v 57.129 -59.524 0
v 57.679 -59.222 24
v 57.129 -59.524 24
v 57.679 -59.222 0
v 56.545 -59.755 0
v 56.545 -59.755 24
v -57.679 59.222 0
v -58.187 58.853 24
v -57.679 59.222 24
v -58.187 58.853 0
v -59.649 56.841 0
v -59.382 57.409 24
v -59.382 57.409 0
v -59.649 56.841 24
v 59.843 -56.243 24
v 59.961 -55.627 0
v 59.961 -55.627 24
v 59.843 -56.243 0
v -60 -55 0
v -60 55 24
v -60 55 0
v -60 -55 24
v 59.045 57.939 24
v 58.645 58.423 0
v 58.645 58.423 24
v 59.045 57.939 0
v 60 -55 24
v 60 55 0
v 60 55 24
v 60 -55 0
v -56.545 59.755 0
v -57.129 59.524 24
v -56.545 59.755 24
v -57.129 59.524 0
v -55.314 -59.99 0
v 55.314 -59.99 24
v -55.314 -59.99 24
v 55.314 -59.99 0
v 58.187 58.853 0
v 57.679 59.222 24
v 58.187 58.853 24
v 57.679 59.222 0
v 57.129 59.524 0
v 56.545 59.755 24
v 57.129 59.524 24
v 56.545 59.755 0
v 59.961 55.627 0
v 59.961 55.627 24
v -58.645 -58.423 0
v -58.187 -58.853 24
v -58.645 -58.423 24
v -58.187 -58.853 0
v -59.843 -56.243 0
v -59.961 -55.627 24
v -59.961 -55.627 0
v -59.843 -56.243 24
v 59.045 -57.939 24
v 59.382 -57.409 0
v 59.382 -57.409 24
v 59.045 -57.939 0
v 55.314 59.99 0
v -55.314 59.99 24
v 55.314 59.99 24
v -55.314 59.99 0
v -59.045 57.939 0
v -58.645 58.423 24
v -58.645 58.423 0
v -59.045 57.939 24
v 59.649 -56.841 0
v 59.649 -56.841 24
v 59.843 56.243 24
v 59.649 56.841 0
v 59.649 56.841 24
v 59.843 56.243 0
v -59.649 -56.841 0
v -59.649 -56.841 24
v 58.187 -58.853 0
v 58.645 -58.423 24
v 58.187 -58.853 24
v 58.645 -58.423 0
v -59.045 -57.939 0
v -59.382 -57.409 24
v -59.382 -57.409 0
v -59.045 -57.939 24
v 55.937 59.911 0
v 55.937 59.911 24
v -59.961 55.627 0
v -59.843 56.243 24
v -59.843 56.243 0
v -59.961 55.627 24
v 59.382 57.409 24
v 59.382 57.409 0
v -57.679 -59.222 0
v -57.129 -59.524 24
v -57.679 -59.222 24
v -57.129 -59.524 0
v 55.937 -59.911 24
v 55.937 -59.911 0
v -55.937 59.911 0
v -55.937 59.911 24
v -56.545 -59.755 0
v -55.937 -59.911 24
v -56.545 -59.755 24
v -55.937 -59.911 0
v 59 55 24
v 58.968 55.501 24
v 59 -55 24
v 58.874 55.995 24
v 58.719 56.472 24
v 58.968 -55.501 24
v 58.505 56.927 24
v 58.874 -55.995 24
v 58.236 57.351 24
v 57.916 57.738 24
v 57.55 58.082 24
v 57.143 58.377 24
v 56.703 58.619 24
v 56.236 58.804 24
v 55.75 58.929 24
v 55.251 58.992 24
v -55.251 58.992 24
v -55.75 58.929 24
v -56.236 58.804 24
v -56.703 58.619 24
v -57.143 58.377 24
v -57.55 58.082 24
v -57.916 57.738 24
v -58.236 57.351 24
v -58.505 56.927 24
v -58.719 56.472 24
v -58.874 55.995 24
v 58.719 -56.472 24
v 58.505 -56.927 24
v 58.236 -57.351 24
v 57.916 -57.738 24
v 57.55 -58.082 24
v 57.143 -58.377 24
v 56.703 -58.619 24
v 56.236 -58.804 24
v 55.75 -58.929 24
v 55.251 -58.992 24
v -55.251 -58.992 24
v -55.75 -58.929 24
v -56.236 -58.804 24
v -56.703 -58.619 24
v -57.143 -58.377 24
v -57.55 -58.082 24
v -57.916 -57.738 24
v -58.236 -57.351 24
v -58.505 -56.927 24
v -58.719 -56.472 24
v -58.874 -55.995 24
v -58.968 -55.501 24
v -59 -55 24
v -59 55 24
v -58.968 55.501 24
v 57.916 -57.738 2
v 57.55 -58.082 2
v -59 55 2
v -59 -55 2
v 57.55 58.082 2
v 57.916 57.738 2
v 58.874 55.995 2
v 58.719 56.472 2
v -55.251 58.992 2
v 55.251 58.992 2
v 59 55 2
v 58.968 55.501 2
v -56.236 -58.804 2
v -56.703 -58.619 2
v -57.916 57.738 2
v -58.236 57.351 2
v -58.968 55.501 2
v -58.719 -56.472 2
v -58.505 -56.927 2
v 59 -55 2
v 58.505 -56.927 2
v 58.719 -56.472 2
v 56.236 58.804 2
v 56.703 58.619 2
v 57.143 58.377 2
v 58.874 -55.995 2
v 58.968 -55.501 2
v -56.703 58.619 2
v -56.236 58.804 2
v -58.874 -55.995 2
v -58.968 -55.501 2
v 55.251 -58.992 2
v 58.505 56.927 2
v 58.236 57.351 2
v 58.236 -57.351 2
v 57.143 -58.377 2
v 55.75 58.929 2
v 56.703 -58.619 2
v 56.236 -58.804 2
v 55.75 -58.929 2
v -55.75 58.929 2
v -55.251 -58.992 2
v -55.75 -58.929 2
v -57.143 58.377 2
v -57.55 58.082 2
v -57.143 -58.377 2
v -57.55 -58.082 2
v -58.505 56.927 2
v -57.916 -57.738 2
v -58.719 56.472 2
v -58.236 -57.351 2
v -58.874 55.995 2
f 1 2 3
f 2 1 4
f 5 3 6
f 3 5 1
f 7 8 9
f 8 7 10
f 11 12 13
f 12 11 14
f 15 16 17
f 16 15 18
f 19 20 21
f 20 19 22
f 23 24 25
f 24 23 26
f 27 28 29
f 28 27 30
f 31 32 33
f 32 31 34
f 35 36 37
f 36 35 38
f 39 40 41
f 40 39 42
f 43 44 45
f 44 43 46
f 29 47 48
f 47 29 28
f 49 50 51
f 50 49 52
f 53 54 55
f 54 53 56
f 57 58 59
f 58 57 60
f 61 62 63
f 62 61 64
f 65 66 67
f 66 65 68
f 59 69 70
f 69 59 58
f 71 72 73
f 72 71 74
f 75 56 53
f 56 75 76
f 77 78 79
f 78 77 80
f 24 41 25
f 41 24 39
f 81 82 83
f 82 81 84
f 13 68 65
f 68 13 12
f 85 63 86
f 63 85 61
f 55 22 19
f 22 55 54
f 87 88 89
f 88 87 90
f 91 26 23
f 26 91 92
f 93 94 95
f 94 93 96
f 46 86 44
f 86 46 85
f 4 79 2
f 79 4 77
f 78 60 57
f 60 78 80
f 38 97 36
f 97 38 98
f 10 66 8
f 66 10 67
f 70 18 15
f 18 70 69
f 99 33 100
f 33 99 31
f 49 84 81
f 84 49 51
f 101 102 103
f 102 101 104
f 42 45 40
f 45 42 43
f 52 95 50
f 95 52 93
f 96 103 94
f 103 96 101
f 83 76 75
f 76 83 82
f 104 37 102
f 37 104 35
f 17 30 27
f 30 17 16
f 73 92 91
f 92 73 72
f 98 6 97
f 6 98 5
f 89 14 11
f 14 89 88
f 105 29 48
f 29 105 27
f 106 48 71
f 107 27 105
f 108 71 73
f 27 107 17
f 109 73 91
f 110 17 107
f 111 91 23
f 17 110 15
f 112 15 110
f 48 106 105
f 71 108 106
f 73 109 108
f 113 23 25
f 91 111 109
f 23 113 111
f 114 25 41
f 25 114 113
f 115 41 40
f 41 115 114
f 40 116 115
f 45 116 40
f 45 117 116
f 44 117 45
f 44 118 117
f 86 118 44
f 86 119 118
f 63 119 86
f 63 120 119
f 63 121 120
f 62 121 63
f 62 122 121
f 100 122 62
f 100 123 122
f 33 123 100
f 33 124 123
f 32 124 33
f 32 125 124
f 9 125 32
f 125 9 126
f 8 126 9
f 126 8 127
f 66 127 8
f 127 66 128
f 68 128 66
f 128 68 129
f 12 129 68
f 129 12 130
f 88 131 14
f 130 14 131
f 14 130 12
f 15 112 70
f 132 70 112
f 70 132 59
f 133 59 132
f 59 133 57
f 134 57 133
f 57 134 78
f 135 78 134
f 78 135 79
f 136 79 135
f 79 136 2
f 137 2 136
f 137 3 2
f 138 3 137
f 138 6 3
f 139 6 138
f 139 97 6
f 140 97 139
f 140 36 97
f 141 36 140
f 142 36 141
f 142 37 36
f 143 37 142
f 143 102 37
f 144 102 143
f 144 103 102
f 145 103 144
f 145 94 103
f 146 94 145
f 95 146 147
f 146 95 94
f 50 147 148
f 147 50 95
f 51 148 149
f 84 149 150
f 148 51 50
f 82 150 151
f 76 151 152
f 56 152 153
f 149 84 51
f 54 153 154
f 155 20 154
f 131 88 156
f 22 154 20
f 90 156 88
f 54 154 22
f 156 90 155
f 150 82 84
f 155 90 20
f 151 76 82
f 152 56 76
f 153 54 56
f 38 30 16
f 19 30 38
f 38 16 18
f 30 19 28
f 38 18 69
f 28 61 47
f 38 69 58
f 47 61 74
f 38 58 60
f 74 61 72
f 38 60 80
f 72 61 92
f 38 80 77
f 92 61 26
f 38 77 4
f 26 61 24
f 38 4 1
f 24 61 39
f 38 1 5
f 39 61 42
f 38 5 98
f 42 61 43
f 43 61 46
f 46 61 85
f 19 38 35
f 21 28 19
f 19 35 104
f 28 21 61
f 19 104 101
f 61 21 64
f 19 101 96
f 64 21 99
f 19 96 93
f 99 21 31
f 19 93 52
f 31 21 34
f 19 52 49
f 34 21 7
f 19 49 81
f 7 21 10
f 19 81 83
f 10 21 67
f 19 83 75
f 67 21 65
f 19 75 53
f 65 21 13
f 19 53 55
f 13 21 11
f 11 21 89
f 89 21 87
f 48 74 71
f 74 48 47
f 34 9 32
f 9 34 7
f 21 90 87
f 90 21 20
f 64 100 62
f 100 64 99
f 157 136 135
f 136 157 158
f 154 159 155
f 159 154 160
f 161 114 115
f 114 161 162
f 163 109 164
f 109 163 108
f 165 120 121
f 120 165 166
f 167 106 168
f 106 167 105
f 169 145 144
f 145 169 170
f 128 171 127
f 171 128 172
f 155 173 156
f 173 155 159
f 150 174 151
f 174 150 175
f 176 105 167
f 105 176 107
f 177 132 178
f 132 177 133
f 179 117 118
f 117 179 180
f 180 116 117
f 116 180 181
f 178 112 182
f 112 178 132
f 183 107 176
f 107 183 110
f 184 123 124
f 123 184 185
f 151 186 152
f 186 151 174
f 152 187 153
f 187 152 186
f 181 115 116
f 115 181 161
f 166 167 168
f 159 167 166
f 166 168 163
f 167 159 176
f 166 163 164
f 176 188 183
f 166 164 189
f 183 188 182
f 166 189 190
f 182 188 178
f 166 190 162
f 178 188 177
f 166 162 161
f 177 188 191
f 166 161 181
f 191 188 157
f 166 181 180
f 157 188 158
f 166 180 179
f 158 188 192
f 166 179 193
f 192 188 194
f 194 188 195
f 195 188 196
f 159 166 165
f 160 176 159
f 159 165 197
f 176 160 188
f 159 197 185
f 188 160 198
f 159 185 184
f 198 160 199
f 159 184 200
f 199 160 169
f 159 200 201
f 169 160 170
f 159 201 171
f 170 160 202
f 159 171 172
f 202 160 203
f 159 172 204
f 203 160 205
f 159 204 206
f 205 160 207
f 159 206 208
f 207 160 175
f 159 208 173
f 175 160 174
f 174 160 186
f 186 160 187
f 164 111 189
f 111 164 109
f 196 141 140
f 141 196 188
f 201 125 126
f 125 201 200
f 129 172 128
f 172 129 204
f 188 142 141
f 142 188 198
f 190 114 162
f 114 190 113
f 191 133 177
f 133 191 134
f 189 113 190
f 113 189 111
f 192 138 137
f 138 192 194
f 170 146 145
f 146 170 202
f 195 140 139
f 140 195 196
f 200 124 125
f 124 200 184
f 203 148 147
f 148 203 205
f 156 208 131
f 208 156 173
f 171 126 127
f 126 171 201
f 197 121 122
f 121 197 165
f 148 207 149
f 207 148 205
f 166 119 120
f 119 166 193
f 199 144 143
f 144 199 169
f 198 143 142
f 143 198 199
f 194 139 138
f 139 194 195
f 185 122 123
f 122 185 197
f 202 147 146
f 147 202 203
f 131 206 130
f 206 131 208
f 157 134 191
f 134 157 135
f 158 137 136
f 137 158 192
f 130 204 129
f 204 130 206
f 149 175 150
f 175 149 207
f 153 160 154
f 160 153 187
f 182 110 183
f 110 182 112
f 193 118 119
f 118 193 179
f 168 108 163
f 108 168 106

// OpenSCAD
$fn = 50;


difference() {
	union() {
		hull() {
			translate(v = [-55.0000000000, 55.0000000000, 0]) {
				cylinder(h = 24, r = 5);
			}
			translate(v = [55.0000000000, 55.0000000000, 0]) {
				cylinder(h = 24, r = 5);
			}
			translate(v = [-55.0000000000, -55.0000000000, 0]) {
				cylinder(h = 24, r = 5);
			}
			translate(v = [55.0000000000, -55.0000000000, 0]) {
				cylinder(h = 24, r = 5);
			}
		}
	}
	union() {
		translate(v = [0, 0, 2]) {
			hull() {
				translate(v = [-55.0000000000, 55.0000000000, 0]) {
					cylinder(h = 22, r = 4);
				}
				translate(v = [55.0000000000, 55.0000000000, 0]) {
					cylinder(h = 22, r = 4);
				}
				translate(v = [-55.0000000000, -55.0000000000, 0]) {
					cylinder(h = 22, r = 4);
				}
				translate(v = [55.0000000000, -55.0000000000, 0]) {
					cylinder(h = 22, r = 4);
				}
			}
		}
	}
}
